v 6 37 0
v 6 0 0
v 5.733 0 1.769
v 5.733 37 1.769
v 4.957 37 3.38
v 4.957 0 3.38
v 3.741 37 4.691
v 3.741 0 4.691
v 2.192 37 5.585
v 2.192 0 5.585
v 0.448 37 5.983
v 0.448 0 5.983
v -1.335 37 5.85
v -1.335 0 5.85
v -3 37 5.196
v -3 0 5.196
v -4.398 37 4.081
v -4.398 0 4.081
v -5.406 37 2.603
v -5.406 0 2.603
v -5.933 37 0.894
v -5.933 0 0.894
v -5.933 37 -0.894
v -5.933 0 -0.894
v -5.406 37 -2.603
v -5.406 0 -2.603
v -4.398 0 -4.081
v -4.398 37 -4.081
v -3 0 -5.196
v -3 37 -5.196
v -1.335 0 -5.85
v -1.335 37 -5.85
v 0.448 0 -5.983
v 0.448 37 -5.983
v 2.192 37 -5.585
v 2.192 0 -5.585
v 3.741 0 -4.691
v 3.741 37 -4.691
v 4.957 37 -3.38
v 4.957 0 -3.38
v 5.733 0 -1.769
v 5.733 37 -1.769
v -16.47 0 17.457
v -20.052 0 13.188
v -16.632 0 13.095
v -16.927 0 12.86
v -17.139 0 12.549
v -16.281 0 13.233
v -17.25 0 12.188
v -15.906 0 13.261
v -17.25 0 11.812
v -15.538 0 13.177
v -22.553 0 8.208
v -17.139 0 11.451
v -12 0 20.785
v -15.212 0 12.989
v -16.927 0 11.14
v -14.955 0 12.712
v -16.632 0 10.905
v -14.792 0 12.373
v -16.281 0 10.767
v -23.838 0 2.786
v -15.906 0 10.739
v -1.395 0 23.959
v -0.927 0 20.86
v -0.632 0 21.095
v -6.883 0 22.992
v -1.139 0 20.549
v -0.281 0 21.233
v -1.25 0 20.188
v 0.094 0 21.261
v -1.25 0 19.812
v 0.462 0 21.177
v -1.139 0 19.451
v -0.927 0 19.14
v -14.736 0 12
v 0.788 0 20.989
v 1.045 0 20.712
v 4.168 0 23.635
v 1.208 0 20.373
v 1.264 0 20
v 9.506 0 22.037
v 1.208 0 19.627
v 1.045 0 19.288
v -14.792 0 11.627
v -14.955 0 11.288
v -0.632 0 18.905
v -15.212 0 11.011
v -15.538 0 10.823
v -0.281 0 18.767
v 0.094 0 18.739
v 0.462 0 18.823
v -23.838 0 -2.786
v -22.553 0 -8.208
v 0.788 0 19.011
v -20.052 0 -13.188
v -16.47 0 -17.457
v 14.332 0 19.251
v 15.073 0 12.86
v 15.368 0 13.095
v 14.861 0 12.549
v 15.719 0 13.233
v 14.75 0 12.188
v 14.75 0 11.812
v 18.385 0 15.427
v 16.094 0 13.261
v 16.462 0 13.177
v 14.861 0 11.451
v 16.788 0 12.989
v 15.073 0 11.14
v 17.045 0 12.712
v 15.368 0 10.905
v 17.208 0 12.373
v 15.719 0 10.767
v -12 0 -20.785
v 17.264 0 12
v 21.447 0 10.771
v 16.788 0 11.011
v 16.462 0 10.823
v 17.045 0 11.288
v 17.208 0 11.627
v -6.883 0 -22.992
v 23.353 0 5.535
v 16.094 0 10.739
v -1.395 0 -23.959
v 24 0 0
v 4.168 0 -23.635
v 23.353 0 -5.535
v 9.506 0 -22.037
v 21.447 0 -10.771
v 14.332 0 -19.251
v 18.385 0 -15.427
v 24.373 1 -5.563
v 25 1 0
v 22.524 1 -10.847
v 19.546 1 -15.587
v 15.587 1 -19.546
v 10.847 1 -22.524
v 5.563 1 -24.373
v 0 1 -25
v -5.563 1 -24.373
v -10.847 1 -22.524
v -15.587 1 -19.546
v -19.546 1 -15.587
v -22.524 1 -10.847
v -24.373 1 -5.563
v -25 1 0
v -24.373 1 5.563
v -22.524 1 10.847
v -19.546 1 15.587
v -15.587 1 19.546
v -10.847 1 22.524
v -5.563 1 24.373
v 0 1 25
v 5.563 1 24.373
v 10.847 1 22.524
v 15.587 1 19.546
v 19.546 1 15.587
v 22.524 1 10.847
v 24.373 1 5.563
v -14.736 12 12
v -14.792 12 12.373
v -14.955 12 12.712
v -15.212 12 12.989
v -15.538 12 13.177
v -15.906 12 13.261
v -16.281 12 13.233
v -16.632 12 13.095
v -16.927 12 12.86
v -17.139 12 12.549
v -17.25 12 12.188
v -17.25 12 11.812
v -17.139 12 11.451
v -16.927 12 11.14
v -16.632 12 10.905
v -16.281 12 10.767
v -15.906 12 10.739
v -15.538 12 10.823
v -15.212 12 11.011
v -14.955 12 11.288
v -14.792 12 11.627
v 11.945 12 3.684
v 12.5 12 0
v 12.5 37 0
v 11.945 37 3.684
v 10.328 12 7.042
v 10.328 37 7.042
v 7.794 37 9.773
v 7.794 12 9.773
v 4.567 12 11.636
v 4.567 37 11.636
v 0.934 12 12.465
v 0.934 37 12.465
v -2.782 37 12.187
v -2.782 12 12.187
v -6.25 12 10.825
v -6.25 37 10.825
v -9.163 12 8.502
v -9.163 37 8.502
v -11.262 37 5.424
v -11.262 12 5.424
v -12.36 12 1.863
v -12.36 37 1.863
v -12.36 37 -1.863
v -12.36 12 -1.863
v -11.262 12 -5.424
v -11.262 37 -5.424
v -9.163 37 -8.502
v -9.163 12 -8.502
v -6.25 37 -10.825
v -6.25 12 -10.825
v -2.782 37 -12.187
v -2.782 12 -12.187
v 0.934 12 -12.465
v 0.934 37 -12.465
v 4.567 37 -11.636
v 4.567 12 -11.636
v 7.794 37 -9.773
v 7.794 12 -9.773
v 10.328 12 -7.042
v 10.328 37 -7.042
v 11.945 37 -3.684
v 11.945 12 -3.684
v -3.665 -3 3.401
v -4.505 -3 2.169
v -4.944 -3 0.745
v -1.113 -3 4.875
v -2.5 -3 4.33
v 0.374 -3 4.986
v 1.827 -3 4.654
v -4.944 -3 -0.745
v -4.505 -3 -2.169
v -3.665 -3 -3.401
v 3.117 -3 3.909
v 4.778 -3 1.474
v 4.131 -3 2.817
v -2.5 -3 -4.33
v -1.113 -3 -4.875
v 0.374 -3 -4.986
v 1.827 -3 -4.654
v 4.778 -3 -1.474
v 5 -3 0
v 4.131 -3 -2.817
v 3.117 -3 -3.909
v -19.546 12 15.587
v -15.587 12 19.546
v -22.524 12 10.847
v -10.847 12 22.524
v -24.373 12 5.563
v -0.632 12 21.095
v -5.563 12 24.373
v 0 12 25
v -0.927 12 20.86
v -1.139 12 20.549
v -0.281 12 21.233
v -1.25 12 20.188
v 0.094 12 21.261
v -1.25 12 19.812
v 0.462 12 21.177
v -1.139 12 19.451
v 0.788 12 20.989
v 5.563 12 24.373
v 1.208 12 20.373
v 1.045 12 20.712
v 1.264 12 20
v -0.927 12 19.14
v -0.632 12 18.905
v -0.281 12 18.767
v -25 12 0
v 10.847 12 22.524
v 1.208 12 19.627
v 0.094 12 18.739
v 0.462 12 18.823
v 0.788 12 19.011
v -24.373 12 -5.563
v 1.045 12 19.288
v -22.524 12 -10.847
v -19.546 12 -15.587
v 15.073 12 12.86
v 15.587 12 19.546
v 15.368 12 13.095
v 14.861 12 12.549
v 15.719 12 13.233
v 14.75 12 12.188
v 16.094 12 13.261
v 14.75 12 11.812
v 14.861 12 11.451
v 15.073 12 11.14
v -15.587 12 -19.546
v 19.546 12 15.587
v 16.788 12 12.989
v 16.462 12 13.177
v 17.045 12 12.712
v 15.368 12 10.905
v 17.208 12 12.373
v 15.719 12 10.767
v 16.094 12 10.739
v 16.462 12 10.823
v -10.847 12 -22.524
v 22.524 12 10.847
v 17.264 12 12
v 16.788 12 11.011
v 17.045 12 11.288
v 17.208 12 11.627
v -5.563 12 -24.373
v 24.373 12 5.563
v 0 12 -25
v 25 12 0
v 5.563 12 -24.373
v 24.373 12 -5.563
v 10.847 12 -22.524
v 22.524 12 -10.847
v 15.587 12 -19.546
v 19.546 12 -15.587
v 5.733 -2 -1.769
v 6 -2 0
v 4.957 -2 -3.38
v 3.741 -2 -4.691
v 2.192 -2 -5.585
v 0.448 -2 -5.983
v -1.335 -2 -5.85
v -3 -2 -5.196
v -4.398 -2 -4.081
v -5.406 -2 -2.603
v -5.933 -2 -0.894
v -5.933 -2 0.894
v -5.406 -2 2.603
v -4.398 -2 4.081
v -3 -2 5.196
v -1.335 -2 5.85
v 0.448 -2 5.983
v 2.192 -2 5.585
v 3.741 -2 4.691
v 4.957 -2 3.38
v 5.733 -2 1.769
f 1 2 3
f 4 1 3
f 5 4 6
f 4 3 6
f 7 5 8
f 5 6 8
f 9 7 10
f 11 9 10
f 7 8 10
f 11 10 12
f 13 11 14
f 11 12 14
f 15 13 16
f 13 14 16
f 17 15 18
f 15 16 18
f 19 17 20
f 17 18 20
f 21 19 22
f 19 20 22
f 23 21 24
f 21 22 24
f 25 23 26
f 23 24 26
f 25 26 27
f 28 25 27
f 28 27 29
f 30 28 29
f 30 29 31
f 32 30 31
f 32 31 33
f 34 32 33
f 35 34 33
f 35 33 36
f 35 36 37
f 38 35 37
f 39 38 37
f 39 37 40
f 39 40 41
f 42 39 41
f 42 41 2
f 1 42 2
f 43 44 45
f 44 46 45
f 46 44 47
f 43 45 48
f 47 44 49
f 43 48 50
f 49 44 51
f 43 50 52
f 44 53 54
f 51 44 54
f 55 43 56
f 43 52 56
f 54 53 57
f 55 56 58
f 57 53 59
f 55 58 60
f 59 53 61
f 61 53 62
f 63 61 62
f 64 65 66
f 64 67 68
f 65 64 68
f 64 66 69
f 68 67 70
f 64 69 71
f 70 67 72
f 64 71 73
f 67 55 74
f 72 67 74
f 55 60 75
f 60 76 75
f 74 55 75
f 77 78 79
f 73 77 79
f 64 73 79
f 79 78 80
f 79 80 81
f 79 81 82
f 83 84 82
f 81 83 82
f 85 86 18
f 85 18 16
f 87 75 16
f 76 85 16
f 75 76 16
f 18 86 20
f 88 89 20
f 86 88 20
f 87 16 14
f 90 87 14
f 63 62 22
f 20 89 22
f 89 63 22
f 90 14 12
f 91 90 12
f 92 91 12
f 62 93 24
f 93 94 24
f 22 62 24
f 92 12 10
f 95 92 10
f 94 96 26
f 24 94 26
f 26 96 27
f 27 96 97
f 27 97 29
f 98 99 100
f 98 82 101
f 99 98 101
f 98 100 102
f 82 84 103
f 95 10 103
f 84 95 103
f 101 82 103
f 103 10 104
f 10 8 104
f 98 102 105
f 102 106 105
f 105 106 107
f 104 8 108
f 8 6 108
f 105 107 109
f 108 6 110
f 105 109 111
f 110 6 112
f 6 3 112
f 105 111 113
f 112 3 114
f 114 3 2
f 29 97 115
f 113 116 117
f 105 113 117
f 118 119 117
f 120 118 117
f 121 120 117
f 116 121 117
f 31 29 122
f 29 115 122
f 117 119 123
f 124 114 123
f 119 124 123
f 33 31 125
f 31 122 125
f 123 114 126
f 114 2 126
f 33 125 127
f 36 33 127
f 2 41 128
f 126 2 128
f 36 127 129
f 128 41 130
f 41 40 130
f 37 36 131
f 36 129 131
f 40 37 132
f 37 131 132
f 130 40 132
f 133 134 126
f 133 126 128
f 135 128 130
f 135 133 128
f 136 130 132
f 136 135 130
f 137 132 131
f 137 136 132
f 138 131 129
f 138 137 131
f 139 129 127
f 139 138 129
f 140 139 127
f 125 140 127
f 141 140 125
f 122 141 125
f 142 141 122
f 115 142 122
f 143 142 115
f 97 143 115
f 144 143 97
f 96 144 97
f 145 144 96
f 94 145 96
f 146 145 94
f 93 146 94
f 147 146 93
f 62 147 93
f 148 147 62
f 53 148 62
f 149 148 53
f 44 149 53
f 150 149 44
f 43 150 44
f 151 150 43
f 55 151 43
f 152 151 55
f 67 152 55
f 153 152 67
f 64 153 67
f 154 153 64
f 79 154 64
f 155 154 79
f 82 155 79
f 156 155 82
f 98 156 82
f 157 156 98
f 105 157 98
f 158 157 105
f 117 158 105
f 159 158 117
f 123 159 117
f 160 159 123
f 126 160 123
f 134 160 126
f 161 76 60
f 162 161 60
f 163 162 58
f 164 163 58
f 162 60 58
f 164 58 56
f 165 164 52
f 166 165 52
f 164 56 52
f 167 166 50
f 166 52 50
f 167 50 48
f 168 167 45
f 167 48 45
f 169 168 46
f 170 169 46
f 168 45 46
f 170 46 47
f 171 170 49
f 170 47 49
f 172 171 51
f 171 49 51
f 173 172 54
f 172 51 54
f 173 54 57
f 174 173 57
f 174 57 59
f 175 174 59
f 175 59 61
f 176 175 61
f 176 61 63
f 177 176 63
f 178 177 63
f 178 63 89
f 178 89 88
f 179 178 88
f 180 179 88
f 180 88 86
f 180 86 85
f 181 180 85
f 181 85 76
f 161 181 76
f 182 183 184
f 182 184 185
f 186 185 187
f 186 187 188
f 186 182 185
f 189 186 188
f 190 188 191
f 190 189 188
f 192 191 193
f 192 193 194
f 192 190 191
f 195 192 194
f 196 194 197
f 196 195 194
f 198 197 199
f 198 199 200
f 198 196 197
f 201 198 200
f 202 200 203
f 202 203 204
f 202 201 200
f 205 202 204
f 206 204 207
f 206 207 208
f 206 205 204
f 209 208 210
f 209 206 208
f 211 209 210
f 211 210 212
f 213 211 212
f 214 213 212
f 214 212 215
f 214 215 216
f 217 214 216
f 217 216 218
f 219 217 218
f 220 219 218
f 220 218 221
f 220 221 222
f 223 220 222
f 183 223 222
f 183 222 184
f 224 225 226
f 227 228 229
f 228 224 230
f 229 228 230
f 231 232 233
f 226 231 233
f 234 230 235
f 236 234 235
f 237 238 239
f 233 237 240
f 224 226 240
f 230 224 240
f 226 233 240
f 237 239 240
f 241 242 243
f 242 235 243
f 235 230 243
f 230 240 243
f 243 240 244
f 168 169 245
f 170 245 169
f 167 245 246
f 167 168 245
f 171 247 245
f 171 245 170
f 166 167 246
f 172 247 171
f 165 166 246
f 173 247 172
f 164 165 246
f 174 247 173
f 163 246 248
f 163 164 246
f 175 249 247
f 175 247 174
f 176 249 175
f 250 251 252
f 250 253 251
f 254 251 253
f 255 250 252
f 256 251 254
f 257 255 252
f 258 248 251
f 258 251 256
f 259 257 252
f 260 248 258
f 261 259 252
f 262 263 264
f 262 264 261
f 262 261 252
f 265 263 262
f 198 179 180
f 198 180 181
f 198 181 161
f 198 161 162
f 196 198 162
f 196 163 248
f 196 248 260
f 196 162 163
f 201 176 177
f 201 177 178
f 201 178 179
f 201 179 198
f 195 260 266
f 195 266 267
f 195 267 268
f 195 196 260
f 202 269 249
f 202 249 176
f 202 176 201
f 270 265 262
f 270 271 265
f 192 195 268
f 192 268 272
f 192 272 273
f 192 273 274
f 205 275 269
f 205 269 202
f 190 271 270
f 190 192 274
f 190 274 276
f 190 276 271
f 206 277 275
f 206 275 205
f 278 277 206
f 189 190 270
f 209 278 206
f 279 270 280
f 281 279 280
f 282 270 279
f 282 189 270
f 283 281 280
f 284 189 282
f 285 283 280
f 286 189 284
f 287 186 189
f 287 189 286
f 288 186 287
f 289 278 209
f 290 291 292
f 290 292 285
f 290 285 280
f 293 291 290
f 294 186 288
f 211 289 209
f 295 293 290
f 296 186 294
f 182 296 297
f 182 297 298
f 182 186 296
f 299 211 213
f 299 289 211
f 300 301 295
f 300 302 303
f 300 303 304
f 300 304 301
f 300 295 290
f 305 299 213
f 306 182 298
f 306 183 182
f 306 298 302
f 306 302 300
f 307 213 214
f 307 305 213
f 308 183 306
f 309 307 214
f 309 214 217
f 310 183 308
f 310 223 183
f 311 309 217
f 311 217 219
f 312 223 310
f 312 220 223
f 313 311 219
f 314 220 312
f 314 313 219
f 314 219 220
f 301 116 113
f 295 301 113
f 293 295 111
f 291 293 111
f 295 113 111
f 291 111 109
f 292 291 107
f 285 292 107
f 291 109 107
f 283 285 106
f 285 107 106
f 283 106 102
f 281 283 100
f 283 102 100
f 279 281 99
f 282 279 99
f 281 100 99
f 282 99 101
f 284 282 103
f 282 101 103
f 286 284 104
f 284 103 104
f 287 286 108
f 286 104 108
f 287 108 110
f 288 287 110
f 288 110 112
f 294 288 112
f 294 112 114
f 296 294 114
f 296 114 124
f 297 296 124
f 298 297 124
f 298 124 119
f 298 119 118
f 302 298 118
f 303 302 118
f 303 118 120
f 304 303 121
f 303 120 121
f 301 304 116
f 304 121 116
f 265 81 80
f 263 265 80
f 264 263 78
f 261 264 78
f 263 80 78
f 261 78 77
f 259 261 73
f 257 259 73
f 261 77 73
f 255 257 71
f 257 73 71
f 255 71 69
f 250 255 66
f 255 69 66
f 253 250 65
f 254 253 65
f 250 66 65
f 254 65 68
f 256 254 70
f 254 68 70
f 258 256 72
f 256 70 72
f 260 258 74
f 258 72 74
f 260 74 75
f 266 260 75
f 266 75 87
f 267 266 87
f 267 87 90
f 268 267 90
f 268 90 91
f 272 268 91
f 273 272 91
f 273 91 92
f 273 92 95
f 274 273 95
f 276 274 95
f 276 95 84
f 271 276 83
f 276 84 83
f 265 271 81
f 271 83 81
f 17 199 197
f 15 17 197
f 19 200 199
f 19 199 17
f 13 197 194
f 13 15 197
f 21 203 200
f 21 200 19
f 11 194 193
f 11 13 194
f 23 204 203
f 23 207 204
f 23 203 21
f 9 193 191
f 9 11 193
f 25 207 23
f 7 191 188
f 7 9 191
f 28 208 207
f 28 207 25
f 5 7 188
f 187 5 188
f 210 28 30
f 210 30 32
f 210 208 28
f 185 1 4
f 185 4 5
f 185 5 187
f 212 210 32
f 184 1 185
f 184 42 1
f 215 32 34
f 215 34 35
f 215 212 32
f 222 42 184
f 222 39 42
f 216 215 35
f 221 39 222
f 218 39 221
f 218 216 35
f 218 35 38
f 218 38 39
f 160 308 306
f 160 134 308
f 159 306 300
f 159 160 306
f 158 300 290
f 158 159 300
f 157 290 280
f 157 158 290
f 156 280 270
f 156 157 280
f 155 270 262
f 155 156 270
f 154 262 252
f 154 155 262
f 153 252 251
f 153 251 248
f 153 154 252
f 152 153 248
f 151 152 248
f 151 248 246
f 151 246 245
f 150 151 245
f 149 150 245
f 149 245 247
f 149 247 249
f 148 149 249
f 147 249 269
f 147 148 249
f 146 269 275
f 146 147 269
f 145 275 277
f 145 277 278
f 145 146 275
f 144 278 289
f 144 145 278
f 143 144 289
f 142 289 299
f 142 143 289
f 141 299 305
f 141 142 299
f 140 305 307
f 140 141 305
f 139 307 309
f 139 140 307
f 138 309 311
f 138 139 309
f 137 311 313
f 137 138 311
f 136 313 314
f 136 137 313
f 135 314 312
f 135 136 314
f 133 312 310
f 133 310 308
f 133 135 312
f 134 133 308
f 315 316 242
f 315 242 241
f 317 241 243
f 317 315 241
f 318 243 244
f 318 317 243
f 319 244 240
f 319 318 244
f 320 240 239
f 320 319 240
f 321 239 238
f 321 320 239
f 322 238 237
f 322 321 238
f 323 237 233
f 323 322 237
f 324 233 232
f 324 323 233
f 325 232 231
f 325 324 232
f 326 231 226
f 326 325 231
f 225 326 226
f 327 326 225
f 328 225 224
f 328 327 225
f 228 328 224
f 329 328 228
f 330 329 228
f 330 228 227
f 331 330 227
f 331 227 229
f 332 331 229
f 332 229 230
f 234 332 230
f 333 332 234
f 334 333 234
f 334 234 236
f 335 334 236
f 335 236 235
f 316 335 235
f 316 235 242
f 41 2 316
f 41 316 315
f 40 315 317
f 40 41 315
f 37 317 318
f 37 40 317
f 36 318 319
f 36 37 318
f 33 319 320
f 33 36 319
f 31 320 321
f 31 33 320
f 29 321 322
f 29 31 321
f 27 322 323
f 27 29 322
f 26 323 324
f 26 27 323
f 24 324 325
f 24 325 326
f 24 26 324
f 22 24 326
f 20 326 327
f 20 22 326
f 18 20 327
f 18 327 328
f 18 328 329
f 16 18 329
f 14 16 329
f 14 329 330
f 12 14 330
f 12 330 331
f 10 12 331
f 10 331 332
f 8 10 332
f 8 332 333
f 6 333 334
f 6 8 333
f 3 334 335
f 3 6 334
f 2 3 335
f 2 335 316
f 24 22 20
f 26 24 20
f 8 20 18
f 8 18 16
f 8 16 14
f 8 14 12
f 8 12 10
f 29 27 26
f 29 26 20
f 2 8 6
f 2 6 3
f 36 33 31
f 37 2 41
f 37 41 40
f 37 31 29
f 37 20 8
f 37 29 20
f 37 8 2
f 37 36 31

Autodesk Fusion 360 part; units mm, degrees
sketch "Sketch1" plane through (0, 0, 0) normal (0, 1, 0) x (1, 0, 0)
  circle A0 centre (0, 0) radius 6
  circle A1 centre (0, 0) radius 25
  circle A2 centre (0, 0) radius 12.5
  circle A3 centre (0, 0) radius 20 construction
  circle A4 centre (16, -12) radius 1.5
  line L0 (0, -25) -> (0, 0) construction
  circle A5 centre (-16, -12) radius 1.5
  circle A6 centre (0, -20) radius 1.5
  dimension "d10" = 12
  dimension "d11" = 50
  dimension "d12" = 25
  dimension "d13" = 40
  dimension "d14" = 3
  dimension "d16" = 12
  dimension "d17" = 3
extrude "Extrude1" add sketch "Sketch1" against normal blind 3 contours A0 makes body 1
extrude "Extrude2" add sketch "Sketch1" along normal blind 37 separate body contours A2 makes body 2
extrude "Extrude3" add sketch "Sketch1" along normal blind 12 contours A1 bodies 2
chamfer "Chamfer1" distance 1 angle 45 2 edges at (-5.594, -3, -2.1697) (-23.3082, 0, 9.0404) on bodies 1 2
thread "Thread1" "ISO Metric profile 3.0 M3x0.5 6H" major diameter 3.086 minor diameter 2.529 pitch 0.5 angle 60 resizes the face on face at (-14.5019, 8, 12.0748) on bodies 2
thread "Thread2" "ISO Metric profile 3.0 M3x0.5 6H" major diameter 3.086 minor diameter 2.529 pitch 0.5 angle 60 resizes the face on face at (1.4981, 4, 19.9252) on face at (17.4981, 4, 11.9252) on face at (-14.7371, 4, 11.937) on bodies 2
equation "knob_height = 3 mm"
equation "chamfer = 1 mm"
equation "base_height = 12 mm"
equation "center_height = 25 mm"
equation "center_diameter = 25 mm"
equation "knob_diameter = 12 mm"
equation "threaded_hole_distance_from_center = 40 mm"
equation "base_diameter = 50 mm"
equation "threaded_hole_diameter = 3 mm"
equation "d10 = knob_diameter"
equation "d11 = base_diameter"
equation "d12 = center_diameter"
equation "d13 = threaded_hole_distance_from_center"
equation "d14 = threaded_hole_diameter"
equation "threaded_hole_height = 12 mm"
equation "d16 = threaded_hole_height"
equation "d17 = threaded_hole_diameter"
equation "d18 = -knob_height"
equation "d20 = center_height + base_height"
equation "d22 = base_height"
equation "d24 = chamfer"
